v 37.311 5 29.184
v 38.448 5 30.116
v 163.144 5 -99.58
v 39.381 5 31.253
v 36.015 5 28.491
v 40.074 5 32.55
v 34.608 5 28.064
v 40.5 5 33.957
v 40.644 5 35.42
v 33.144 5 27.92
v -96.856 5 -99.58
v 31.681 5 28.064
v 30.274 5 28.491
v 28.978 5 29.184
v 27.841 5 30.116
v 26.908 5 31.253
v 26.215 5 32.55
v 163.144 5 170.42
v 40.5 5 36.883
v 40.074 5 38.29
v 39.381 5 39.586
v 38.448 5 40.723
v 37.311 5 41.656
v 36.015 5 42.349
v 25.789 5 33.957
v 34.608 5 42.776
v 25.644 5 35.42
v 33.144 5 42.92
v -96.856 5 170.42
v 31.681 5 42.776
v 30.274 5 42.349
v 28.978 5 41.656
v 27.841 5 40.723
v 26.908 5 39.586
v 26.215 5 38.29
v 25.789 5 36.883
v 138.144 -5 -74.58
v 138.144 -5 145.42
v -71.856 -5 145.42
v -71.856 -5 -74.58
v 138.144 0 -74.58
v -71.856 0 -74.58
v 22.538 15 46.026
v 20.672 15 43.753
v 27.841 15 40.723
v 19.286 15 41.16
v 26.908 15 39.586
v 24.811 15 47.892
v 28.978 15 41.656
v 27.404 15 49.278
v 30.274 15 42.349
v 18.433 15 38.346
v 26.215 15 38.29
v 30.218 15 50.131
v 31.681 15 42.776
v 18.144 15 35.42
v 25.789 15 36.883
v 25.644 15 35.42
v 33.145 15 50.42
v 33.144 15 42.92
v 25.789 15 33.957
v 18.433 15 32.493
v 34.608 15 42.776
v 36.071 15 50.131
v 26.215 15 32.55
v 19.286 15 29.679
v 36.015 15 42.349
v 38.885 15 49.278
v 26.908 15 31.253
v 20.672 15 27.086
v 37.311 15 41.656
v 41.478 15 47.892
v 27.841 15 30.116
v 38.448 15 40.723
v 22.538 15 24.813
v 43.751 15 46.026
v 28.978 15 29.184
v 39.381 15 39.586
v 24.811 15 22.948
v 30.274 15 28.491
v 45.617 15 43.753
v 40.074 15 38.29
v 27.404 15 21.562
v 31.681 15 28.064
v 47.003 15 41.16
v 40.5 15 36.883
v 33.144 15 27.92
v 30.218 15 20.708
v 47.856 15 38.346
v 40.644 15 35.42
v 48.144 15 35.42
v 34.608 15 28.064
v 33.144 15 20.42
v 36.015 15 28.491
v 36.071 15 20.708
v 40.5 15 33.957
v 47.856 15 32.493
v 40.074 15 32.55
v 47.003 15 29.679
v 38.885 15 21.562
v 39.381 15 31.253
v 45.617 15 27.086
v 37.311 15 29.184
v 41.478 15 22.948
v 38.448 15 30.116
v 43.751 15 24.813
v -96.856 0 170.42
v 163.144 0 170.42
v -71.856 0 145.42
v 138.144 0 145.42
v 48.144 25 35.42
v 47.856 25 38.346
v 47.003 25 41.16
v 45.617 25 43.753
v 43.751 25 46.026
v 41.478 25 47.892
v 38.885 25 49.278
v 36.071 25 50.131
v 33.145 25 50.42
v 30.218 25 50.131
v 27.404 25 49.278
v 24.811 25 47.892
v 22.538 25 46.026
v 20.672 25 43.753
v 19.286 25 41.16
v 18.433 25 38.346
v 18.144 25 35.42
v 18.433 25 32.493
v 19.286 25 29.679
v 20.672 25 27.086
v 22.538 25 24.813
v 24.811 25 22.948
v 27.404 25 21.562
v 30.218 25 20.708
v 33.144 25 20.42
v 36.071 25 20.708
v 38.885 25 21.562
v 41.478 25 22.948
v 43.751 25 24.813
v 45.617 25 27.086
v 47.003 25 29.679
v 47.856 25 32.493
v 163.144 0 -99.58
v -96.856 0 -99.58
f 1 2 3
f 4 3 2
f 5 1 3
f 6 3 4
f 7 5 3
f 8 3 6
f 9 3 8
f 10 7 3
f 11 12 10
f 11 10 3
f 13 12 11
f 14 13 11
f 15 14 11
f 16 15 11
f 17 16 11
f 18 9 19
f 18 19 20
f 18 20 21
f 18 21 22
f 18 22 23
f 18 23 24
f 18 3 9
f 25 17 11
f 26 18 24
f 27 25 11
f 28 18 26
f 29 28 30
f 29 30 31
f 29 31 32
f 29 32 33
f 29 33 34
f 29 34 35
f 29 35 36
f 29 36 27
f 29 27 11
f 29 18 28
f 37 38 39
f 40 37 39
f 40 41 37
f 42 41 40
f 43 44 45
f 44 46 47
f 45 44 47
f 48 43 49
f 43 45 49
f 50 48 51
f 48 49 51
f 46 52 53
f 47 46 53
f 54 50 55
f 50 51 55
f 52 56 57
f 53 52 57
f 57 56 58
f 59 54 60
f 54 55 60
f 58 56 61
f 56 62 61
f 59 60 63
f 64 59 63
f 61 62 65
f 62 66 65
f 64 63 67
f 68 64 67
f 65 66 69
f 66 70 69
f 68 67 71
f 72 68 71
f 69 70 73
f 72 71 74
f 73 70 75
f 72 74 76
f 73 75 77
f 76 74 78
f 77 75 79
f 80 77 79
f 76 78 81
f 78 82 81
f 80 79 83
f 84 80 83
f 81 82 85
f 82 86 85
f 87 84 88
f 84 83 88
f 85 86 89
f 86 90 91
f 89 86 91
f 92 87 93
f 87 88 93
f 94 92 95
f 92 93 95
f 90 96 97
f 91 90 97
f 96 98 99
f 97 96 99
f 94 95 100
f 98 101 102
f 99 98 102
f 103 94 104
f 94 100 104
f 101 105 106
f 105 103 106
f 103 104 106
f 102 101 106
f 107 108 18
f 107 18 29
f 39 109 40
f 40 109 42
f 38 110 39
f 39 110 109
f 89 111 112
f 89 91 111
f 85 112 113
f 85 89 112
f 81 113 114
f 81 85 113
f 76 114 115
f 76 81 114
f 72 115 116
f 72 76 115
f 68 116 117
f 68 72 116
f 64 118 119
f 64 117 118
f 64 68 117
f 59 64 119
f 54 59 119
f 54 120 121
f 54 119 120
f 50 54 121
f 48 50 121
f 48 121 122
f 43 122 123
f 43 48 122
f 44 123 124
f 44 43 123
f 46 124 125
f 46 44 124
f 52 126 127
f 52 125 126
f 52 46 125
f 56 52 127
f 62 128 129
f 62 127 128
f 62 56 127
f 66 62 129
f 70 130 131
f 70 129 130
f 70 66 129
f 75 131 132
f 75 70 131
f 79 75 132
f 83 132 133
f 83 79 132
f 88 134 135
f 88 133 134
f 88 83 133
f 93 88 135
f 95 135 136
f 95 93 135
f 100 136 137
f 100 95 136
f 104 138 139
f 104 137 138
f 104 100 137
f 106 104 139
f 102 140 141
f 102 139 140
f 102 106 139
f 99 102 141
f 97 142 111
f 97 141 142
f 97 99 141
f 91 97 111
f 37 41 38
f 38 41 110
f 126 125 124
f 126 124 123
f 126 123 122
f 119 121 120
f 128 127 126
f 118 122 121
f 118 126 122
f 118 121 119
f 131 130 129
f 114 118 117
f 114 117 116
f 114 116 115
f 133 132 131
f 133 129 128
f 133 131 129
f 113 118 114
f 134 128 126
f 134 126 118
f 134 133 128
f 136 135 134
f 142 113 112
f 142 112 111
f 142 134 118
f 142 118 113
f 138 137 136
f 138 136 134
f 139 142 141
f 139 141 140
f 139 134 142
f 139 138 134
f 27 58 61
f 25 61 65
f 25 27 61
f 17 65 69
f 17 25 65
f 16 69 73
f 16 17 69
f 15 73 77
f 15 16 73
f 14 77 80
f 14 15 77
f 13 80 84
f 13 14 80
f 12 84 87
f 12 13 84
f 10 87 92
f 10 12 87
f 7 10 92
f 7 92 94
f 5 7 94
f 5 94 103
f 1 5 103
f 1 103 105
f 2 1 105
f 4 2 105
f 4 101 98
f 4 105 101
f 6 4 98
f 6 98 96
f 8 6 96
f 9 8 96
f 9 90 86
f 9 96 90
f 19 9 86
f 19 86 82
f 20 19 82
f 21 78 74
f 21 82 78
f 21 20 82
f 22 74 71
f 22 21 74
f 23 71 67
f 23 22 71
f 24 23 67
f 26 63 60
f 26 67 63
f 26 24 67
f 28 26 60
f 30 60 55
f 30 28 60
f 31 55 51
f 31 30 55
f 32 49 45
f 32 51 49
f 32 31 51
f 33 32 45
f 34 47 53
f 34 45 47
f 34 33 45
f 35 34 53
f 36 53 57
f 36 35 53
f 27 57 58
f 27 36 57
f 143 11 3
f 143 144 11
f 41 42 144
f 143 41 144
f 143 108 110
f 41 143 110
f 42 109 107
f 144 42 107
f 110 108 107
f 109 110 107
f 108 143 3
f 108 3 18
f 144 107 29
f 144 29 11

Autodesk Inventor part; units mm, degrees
ref_plane "YZ Plane" through (0, 0, 0) normal (1, 0, 0) x (0, 1, 0)
ref_plane "XZ Plane" through (0, 0, 0) normal (0, 1, 0) x (-1, 0, 0)
ref_plane "XY Plane" through (0, 0, 0) normal (0, 0, 1) x (1, 0, 0)
sketch "Sketch1" plane through (0, 0, 0) normal (0, 1, 0) x (-1, 0, 0)
  line L0 (-138.1445, 75.4197) -> (-138.1445, 125.4197)
  line L1 (-138.1445, -54.5803) -> (-138.1445, -4.5803)
  line L2 (-118.1445, -74.5803) -> (-68.1445, -74.5803)
  line L3 (1.8555, -74.5803) -> (51.8555, -74.5803)
  line L4 (71.8555, -54.5803) -> (71.8555, -4.5803)
  line L5 (71.8555, 125.4197) -> (71.8555, 75.4197)
  line L6 (51.8555, 145.4197) -> (1.8555, 145.4197)
  line L7 (-68.1445, 145.4197) -> (-118.1445, 145.4197)
  line L8 (51.8555, -74.5803) -> (71.8555, -74.5803)
  line L9 (71.8555, -74.5803) -> (71.8555, -54.5803)
  line L10 (71.8555, -74.5803) -> (-138.1445, -74.5803)
  line L11 (-138.1445, -74.5803) -> (-138.1445, 145.4197)
  line L12 (-138.1445, 145.4197) -> (71.8555, 145.4197)
  line L13 (71.8555, 145.4197) -> (71.8555, -74.5803)
  line L14 (96.8555, -89.5803) -> (96.8555, -99.5803)
  line L15 (96.8555, -99.5803) -> (-163.1445, -99.5803)
  line L16 (-163.1445, -99.5803) -> (-163.1445, 170.4197)
  line L17 (-163.1445, 170.4197) -> (96.8555, 170.4197)
  line L18 (96.8555, 170.4197) -> (96.8555, -99.5803)
  circle A0 centre (-33.1445, 35.4197) radius 7.5
  circle A1 centre (-33.1445, 35.4197) radius 15
  point P0 (0, 0)
  dimension "d37" = 260
  dimension "d38" = 270
  dimension "d39" = 260
  dimension "d40" = 15
  dimension "d41" = 30
extrude "Extrusion2" add sketch "Sketch1" against normal blind 5 contours L0 L11 L12 L7 L6 L13 L5 L4 L9 L8 L3 L10 L2 L1 | A0 | A1
extrude "Extrusion3" add sketch "Sketch1" along normal blind 5 contours L0 L11 L12 L7 L6 L13 L5 L4 L9 L8 L3 L10 L2 L1 | L14 L15 L16 L17 L18 | A0 | A1
extrude "Extrusion4" add sketch "Sketch1" along normal blind 15 contours A0
ref_plane "Work Plane3" through (33.1445, 15, 35.4197) normal (0, 1, 0) x (1, 0, 0)
sketch "Sketch2" plane through (33.1445, 15, 35.4197) normal (0, 1, 0) x (1, 0, 0)
  circle A0 centre (0, 0) radius 15
  point P0 (-33.1445, 35.4197)
  dimension "d53" = 30
extrude "Extrusion6" add sketch "Sketch2" along normal blind 10
properties part number "Part Buttom"
